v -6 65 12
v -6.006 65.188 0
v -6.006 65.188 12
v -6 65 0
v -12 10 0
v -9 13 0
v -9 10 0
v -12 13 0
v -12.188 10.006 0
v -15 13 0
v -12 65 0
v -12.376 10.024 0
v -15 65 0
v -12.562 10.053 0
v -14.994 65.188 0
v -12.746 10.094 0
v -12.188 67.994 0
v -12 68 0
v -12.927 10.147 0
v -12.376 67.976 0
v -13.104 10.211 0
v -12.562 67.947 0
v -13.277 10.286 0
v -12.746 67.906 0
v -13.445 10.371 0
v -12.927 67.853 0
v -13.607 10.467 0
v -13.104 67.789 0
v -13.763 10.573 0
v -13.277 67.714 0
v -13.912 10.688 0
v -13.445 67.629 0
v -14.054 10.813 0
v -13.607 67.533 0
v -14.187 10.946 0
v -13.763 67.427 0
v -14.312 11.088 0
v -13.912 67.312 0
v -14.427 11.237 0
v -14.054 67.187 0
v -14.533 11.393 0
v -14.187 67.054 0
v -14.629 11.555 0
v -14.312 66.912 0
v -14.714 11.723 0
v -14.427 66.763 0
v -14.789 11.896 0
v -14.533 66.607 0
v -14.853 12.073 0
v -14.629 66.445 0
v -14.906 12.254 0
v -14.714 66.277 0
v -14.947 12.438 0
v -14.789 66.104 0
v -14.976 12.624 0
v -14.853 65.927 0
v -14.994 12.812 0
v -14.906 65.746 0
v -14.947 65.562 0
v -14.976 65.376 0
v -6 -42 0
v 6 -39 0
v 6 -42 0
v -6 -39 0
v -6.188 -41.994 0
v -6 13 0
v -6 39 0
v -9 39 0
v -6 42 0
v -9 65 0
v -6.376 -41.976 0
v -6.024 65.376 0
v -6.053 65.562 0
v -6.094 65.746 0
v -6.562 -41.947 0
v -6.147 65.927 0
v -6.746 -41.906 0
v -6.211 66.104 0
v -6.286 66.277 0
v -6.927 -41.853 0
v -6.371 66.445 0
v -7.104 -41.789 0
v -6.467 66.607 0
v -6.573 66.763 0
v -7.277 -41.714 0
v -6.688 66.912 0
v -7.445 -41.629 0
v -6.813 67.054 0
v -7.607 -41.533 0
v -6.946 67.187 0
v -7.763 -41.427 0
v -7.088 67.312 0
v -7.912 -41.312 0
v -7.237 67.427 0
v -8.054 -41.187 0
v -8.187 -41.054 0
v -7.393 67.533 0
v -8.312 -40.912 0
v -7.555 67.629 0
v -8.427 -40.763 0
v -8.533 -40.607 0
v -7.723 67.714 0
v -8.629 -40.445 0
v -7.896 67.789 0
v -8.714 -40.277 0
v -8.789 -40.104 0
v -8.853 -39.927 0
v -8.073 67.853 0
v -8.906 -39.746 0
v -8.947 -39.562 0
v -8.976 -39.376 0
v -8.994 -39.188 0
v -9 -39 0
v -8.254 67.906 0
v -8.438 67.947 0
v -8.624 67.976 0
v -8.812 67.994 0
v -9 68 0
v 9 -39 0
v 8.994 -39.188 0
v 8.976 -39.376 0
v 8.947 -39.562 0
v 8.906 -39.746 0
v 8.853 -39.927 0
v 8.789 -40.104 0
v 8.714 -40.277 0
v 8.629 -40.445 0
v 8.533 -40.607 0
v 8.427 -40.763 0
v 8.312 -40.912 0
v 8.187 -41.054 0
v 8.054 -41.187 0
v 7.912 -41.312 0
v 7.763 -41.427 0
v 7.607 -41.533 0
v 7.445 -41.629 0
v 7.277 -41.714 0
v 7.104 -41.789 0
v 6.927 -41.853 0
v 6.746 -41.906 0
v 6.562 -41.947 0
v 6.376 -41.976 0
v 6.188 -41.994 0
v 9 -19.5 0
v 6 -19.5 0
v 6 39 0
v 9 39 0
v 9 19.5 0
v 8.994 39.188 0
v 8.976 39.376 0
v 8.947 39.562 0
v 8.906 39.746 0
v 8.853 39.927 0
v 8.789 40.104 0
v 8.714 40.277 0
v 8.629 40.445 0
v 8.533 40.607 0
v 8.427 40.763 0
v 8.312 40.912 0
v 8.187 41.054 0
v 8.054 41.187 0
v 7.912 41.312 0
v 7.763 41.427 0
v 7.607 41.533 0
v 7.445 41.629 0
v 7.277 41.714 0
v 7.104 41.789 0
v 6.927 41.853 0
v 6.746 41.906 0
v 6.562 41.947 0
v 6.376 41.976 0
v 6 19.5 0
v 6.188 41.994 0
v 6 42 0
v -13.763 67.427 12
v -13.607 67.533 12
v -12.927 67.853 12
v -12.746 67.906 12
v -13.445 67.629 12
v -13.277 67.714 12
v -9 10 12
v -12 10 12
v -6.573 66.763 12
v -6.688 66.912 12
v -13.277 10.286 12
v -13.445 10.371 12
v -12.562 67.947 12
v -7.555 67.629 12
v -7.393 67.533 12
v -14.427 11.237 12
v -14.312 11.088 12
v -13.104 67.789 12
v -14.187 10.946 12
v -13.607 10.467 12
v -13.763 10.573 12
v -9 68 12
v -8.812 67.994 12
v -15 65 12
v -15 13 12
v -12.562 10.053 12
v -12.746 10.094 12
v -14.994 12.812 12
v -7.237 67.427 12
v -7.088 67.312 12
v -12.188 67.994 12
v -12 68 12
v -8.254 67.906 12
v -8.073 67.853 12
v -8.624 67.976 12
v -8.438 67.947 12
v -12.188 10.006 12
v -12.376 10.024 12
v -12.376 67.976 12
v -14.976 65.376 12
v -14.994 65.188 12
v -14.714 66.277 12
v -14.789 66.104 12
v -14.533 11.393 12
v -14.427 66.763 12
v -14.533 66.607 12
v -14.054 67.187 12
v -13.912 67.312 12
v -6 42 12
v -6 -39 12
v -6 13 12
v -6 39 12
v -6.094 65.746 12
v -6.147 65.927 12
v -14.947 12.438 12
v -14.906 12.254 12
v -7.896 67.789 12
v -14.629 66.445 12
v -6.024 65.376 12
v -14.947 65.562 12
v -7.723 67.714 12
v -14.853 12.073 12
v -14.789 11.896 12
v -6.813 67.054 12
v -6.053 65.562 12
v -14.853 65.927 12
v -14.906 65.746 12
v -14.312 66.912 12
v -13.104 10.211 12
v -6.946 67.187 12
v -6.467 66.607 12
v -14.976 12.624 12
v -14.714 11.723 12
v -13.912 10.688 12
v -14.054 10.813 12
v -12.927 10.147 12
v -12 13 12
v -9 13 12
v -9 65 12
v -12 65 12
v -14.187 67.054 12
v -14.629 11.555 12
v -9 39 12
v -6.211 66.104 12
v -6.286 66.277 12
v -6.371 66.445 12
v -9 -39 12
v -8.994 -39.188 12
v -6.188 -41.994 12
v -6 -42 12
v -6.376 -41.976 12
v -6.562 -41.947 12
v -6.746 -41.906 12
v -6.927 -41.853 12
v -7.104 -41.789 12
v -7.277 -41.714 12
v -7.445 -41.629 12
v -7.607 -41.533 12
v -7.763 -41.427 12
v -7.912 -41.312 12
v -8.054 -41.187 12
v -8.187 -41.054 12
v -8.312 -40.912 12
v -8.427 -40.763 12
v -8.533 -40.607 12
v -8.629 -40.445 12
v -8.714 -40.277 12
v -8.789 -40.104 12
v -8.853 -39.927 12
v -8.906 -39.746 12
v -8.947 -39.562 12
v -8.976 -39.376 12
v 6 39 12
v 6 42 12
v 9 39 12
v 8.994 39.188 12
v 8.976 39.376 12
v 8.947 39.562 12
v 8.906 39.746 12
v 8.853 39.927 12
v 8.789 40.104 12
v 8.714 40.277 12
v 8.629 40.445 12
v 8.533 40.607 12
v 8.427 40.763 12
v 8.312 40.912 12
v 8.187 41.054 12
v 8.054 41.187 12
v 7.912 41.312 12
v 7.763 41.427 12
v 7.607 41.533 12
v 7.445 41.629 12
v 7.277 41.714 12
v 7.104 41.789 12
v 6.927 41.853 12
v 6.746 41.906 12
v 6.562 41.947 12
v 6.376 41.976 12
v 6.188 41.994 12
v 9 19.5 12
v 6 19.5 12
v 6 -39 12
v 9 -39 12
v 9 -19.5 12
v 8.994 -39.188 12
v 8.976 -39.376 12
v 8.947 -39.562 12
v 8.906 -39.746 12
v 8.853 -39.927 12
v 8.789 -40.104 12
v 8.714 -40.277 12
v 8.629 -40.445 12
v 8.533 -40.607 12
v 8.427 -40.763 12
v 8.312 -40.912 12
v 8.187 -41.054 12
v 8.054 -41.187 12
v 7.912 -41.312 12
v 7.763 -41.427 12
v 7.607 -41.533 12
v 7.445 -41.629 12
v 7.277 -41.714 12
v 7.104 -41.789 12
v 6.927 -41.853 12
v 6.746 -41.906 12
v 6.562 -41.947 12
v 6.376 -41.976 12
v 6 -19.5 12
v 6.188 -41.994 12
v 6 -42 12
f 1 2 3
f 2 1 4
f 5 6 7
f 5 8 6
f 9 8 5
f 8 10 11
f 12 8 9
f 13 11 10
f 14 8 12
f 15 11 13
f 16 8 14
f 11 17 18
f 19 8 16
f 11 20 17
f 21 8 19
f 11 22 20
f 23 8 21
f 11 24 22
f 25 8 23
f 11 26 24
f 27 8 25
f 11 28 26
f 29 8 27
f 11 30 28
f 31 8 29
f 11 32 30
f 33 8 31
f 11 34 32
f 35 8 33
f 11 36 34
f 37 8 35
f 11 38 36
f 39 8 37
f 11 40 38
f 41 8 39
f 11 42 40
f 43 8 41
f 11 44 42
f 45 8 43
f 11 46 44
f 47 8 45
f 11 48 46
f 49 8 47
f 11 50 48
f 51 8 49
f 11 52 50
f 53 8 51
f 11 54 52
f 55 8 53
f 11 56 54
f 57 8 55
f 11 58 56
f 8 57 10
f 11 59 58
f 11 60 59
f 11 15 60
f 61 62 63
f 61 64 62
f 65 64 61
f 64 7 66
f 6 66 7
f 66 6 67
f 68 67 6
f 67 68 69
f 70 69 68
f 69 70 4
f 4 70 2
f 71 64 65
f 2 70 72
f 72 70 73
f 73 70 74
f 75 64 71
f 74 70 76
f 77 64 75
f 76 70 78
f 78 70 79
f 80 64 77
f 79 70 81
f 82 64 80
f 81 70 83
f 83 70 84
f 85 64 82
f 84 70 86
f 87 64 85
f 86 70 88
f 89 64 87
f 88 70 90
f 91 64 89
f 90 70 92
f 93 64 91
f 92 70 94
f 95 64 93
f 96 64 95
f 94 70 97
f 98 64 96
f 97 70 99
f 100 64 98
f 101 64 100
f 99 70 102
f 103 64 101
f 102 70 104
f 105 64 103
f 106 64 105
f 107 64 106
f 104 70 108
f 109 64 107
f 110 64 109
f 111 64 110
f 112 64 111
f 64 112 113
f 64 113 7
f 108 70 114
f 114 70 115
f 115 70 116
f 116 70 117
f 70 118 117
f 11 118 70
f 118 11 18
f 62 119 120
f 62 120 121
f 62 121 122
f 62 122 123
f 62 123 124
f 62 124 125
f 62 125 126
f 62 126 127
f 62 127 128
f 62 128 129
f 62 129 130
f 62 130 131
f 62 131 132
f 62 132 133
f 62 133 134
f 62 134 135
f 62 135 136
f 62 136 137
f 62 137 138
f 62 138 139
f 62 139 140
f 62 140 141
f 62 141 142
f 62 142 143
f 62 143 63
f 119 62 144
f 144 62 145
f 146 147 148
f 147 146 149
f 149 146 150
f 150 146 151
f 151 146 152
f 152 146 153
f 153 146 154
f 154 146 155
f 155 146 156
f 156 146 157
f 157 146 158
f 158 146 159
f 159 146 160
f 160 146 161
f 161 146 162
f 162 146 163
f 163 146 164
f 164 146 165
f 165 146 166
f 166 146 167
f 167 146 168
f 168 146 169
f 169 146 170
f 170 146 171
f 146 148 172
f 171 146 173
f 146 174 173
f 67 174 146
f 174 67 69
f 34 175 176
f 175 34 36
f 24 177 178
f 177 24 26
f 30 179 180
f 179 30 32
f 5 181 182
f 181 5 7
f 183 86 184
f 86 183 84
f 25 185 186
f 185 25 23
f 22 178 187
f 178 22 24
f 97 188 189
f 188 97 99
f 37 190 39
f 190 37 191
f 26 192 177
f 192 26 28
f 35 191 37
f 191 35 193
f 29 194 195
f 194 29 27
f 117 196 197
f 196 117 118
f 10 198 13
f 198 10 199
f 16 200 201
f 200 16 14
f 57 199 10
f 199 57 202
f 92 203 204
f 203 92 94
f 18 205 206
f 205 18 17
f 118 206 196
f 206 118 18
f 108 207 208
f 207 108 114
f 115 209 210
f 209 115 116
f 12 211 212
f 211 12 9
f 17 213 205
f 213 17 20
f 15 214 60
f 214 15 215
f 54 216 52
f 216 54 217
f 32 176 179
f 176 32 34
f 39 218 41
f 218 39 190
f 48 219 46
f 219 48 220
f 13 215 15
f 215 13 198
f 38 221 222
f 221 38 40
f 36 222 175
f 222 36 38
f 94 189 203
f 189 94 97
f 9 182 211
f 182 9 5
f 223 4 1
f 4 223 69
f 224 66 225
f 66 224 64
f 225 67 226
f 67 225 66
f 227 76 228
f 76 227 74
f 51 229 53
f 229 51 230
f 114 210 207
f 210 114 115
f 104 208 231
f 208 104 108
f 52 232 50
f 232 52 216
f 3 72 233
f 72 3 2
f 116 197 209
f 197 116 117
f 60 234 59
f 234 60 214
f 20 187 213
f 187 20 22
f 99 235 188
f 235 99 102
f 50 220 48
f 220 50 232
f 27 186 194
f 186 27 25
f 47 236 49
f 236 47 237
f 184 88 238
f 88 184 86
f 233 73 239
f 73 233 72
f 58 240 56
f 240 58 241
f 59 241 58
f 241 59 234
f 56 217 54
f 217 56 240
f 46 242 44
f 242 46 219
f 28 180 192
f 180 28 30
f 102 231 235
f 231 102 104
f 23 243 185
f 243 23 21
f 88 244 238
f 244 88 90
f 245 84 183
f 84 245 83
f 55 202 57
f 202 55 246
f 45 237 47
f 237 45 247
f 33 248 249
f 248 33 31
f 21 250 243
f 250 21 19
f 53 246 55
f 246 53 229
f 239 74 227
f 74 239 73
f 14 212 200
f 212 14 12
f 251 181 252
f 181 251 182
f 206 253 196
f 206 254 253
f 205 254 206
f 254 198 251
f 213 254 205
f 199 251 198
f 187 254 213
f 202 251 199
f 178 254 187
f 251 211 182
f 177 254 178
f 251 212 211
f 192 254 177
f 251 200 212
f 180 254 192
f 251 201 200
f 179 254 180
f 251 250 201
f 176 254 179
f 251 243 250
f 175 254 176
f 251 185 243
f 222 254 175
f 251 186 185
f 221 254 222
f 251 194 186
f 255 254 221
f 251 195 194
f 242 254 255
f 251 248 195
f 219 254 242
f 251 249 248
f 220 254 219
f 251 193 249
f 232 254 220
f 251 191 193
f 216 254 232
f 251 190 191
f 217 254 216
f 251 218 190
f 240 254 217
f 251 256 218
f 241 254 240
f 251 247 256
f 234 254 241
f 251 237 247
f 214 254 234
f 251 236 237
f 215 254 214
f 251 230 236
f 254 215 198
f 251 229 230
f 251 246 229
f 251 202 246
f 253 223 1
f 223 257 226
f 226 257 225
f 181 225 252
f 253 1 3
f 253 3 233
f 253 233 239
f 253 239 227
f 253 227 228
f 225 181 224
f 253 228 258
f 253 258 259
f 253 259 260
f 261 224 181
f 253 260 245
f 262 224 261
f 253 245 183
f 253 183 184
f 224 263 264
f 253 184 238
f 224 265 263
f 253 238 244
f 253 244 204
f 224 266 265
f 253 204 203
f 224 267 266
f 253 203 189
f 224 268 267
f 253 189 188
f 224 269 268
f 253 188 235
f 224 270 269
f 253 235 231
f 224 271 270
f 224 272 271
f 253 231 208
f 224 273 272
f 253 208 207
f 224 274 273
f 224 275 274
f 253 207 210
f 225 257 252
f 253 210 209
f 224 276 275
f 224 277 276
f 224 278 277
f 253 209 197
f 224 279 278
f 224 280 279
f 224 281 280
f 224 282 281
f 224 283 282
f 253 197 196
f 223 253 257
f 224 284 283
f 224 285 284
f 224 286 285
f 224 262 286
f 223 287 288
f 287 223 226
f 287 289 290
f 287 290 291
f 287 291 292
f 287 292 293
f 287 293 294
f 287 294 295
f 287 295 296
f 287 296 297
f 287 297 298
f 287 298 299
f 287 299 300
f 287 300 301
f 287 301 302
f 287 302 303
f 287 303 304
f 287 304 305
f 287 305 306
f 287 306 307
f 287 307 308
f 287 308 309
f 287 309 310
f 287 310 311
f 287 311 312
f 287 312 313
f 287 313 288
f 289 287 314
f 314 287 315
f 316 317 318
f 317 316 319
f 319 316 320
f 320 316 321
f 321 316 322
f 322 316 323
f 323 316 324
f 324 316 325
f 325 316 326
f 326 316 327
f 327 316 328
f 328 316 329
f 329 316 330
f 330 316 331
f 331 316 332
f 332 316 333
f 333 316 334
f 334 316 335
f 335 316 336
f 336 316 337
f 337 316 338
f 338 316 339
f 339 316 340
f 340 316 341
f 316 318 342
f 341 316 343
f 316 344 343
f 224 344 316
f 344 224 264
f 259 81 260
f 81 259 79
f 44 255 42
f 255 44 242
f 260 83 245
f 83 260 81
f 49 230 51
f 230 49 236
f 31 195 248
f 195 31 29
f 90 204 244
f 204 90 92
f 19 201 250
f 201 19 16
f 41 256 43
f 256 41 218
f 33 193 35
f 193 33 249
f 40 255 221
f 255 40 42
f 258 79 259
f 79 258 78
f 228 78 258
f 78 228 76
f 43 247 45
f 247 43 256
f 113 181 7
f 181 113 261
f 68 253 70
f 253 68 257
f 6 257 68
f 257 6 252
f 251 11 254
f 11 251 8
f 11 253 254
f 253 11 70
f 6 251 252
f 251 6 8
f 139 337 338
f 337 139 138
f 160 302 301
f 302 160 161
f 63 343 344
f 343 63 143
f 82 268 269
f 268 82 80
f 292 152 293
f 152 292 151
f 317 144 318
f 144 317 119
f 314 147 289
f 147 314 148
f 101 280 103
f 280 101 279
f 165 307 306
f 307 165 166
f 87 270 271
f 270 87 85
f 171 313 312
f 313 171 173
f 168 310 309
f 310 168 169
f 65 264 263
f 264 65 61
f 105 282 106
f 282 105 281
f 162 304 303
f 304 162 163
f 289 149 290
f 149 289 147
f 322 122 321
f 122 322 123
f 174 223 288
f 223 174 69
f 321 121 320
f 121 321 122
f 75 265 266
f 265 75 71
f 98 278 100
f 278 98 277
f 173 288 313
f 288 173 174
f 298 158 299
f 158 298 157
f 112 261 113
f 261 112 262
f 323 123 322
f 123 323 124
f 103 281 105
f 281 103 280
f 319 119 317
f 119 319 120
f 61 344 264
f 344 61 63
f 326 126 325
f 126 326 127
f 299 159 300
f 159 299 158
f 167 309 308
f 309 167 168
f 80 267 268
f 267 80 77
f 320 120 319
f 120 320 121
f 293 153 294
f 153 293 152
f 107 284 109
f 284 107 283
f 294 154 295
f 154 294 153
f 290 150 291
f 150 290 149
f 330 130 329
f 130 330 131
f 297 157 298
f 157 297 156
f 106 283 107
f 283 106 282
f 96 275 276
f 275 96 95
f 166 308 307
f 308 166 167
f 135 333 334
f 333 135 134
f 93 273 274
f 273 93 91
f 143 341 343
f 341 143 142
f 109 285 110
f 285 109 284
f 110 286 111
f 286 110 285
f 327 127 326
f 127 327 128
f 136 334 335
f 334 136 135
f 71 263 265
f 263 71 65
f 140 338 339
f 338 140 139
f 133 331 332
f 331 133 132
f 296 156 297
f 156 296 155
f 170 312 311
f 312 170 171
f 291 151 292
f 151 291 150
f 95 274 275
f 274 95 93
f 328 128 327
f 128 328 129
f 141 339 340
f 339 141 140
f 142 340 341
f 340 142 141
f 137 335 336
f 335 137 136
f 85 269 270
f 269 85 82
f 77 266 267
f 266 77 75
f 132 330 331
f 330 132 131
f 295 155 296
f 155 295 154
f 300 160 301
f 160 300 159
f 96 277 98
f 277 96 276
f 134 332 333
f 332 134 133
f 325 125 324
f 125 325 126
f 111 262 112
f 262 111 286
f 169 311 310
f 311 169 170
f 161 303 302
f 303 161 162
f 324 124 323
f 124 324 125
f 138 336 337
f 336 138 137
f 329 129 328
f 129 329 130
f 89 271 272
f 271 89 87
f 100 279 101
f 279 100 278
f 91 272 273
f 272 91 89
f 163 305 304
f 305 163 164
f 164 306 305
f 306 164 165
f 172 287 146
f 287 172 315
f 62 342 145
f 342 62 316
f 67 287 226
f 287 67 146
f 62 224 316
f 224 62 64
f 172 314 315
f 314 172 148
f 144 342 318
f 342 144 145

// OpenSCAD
$fn=100;



//CUSTOMIZER VARIABLES
/* [Easy Photo Rig] */
 
//the thickness of your phone
phone_depth = 12; 

//the width of your phone
phone_width = 78; 

//the width of your ruler 
ruler_width = 52; 

//the thickness of your ruler
ruler_thickness = 3;  


//the width of the bracket
bracket_width = 12;  

//the thickness of the walls and radius of the corners
corner_radius =3; 
  
  
//use this to angle the phone down slightly. values above 10 are not recommended
tilt_angle = 0;

//CUSTOMIZER VARIABLES END




module ruler_holder()
{
    //offset the ruler holder from the phone holder
    rotate([0,0,tilt_angle])
    translate([-(phone_depth/2+corner_radius)-(ruler_thickness/2),phone_width/2,0])
difference()
{
hull()
{
    translate([-ruler_thickness/2,ruler_width/2,0])
        cylinder(h=bracket_width,r1=corner_radius,r2=corner_radius);
     translate([ruler_thickness/2,ruler_width/2,0])
        cylinder(h=bracket_width,r1=corner_radius,r2=corner_radius);  
   
   
       translate([-ruler_thickness/2,-ruler_width/2,0])
        cylinder(h=bracket_width,r1=corner_radius,r2=corner_radius);
     translate([ruler_thickness/2,-ruler_width/2,0])
        cylinder(h=bracket_width,r1=corner_radius,r2=corner_radius) ;
   
    
};

    cube([ruler_thickness/2*2,ruler_width/2*2,bracket_width*2+2],true);

}
}



module phone_holder()
{
difference()
{
hull()
{
    translate([-phone_depth/2,phone_width/2,0])
        cylinder(h=bracket_width,r1=corner_radius,r2=corner_radius);
     translate([phone_depth/2,phone_width/2,0])
        cylinder(h=bracket_width,r1=corner_radius,r2=corner_radius);  
   
   
       translate([-phone_depth/2,-phone_width/2,0])
        cylinder(h=bracket_width,r1=corner_radius,r2=corner_radius);
     translate([phone_depth/2,-phone_width/2,0])
        cylinder(h=bracket_width,r1=corner_radius,r2=corner_radius) ;
   
    
};

    cube([phone_depth/2*2,phone_width/2*2,bracket_width*2+2],true);

translate([bracket_width-2,0,0])
    cube([phone_depth/2*2,phone_width/2,bracket_width*2+2],true);
}
}



ruler_holder();
phone_holder();



